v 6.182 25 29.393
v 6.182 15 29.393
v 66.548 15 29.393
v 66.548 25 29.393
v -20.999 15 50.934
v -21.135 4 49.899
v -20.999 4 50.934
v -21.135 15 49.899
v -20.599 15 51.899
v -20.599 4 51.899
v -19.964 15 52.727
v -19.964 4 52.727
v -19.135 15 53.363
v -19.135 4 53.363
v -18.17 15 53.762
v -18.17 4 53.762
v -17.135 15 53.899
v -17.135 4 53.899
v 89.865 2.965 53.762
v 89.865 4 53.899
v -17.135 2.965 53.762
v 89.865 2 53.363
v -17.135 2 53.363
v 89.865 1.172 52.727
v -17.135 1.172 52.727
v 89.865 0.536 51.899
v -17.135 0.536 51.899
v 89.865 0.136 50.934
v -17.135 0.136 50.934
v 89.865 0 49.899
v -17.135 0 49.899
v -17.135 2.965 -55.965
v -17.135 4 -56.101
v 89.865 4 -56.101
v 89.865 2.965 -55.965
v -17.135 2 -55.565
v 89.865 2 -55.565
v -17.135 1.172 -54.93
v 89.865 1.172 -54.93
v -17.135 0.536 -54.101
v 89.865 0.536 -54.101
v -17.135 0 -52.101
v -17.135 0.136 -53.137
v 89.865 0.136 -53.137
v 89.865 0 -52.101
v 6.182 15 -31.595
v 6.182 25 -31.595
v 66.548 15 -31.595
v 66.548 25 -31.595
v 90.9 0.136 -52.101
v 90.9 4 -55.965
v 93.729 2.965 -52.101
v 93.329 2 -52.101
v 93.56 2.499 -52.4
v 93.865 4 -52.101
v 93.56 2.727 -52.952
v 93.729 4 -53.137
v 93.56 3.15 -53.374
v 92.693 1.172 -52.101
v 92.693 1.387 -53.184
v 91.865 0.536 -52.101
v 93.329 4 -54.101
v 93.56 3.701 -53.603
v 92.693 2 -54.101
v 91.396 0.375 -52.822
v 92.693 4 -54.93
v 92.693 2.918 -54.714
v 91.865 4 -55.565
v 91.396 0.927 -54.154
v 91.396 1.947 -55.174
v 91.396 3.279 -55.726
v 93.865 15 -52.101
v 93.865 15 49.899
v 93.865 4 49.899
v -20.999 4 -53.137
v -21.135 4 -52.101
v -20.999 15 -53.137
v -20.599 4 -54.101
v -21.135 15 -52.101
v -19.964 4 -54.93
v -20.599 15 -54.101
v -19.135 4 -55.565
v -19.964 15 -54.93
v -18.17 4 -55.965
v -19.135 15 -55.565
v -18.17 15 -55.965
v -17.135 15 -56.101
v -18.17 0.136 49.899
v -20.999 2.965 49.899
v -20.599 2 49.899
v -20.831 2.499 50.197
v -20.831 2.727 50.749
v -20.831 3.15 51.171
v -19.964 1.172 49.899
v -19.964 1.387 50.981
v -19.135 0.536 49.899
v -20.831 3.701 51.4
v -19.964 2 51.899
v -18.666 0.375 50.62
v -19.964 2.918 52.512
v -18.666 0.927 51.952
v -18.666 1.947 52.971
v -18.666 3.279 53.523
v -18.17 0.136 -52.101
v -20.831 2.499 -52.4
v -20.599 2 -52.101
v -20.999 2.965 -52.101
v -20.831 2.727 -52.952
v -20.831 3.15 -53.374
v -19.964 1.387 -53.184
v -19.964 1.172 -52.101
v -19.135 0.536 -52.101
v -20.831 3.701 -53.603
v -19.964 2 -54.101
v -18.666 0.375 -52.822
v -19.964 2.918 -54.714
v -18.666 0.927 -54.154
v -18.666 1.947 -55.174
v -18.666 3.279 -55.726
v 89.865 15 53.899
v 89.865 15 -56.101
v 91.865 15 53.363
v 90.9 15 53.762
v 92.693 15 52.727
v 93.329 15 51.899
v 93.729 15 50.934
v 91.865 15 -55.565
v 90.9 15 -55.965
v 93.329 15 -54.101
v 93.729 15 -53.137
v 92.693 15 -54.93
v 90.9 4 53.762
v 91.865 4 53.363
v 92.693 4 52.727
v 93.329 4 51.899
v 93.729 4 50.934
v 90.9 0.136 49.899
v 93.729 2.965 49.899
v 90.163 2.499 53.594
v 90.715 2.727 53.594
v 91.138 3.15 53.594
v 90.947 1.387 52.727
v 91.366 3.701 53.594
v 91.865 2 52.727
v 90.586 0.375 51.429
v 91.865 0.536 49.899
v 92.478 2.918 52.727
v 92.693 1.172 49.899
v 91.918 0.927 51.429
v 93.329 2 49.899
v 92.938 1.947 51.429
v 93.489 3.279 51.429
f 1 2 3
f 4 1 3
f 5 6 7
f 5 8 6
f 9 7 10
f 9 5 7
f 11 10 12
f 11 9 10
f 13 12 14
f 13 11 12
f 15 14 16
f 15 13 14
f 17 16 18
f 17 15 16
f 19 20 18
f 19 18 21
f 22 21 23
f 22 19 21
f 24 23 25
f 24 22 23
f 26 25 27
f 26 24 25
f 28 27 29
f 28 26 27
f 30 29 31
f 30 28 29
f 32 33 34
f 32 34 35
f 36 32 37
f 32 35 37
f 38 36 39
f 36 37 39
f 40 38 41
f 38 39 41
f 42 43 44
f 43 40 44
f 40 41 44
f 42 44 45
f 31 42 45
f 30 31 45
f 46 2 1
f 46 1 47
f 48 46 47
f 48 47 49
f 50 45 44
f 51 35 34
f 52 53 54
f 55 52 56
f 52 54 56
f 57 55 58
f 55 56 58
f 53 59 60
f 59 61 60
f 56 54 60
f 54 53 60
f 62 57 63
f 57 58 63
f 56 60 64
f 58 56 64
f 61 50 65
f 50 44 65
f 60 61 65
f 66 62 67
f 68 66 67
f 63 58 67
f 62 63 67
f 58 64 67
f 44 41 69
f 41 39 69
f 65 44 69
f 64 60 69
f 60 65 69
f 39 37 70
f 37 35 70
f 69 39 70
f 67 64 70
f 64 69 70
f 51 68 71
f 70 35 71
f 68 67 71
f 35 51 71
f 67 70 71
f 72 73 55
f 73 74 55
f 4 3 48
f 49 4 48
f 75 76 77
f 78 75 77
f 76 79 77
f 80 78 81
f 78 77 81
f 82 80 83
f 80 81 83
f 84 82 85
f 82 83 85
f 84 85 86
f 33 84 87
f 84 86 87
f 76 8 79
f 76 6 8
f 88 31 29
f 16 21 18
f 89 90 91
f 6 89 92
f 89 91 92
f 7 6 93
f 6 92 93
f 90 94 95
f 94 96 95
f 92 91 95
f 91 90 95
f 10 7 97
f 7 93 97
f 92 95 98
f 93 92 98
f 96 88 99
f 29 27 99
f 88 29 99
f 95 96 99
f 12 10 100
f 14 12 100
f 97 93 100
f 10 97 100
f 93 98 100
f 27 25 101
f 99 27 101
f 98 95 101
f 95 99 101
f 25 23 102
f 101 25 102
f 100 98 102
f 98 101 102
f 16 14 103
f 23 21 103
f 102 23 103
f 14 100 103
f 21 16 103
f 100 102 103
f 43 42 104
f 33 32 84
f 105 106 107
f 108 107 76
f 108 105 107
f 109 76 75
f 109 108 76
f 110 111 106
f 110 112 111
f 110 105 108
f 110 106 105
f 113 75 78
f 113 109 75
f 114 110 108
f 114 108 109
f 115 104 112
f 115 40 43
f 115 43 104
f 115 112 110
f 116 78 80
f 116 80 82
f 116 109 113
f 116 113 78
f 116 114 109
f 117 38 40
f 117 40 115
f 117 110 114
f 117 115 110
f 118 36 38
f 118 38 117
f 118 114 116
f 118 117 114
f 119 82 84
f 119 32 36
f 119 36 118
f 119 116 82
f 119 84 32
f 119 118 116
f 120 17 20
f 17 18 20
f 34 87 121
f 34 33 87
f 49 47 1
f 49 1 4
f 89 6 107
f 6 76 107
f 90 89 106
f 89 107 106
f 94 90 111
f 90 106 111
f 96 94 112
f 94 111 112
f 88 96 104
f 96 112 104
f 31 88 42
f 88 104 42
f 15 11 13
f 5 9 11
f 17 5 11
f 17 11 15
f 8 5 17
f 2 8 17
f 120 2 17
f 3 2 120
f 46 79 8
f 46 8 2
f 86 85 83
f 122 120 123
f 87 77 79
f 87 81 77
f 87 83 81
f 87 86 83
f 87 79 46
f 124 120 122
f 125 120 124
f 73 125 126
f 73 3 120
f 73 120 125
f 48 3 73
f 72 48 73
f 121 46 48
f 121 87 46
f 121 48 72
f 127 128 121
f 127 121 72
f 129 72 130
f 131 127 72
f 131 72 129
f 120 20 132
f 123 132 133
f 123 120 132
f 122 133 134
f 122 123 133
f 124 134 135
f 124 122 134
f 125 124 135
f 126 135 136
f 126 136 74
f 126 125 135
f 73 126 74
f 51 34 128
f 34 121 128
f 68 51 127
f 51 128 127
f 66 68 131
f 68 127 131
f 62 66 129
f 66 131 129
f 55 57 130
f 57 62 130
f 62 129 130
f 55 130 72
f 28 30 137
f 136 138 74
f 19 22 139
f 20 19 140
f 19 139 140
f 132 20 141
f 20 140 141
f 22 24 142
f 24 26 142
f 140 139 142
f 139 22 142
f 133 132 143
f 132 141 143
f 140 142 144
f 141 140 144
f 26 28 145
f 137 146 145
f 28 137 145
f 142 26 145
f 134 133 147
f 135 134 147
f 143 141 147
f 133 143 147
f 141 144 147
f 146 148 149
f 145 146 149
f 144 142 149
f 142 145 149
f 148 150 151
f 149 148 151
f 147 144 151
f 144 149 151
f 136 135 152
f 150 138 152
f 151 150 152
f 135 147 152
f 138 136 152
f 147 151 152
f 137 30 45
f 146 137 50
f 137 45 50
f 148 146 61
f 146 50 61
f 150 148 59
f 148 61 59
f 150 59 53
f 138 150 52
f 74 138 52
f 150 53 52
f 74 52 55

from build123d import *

# Parameters (mm, degrees)
SKETCH2_W           = 115
SKETCH2_H           = 110
BOSS_EXTRUDE1_DEPTH = 15
SKETCH3_W           = 60.365616492
SKETCH3_H           = 60.987942435
BOSS_EXTRUDE2_DEPTH = 10
FILLET2_R           = 4


with BuildPart() as part:
    # Sketch2 → Boss-Extrude1 (new body)
    with BuildSketch(Plane(origin=(0, 0, 0), x_dir=(1, 0, 0), z_dir=(0, 1, 0))):
        with Locations((36.364864865, 1.101351351)):
            Rectangle(SKETCH2_W, SKETCH2_H)
    extrude(amount=BOSS_EXTRUDE1_DEPTH)

    # Sketch3 → Boss-Extrude2 (add)
    with BuildSketch(Plane(origin=(0, 15, 0), x_dir=(1, 0, 0), z_dir=(0, 1, 0))):
        with Locations((36.364864865, 1.101351351)):
            Rectangle(SKETCH3_W, SKETCH3_H)
    extrude(amount=BOSS_EXTRUDE2_DEPTH)

    # Fillet2
    fillet2_edges = [part.edges().sort_by_distance(p)[0] for p in [
        (36.364864865, 0, -56.101351351),
        (93.864864865, 0, -1.101351351),
        (36.364864865, 0, 53.898648649),
        (-21.135135135, 0, -1.101351351),
        (-21.135135135, 7.5, -56.101351351),
        (93.864864865, 7.5, -56.101351351),
        (93.864864865, 7.5, 53.898648649),
        (-21.135135135, 7.5, 53.898648649),
    ]]
    fillet(fillet2_edges, radius=FILLET2_R)


solid = part.part
